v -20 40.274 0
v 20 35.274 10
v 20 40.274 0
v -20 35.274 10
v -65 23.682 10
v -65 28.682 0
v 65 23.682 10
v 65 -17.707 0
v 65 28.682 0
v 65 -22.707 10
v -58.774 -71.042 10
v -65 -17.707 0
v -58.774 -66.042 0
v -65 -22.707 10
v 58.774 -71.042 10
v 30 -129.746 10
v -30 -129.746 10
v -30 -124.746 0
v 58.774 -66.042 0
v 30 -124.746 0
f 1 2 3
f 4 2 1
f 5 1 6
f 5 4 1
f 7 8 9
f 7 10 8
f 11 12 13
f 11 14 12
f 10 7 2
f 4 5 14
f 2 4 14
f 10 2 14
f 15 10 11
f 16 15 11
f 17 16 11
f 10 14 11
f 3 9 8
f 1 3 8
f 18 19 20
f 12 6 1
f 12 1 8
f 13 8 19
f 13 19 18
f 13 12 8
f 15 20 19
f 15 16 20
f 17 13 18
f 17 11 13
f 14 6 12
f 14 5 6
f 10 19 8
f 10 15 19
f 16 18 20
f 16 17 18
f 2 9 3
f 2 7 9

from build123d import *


with BuildPart() as f3:
    # F0 (on Top) → F3 section 0
    with BuildSketch(Plane.XY):
        Polygon((65, 28.6817904562), (20, 40.2744300663), (-20, 40.2744300663), (-65, 28.6817904562), (-65, -17.7070442587), (-58.7742775679, -66.0424605012), (-30, -124.7455254197), (30, -124.7455254197), (58.7742775679, -66.0424605012), (65, -17.7070442587), align=None)
    # F2 (on offset) → F3 section 1
    with BuildSketch(Plane.XY.offset(10)):
        Polygon((58.7742775679, -71.0424605012), (65, -22.7070442587), (65, 23.6817904562), (20, 35.2744300663), (-20, 35.2744300663), (-65, 23.6817904562), (-65, -22.7070442587), (-58.7742775679, -71.0424605012), (-30, -129.7455254197), (30, -129.7455254197), align=None)
    loft()

    # F33: F3 across plane


with BuildPart() as f3_1:
    add(f3.part)
    add(f3.part.mirror(Plane.YZ))


solid = f3_1.part
